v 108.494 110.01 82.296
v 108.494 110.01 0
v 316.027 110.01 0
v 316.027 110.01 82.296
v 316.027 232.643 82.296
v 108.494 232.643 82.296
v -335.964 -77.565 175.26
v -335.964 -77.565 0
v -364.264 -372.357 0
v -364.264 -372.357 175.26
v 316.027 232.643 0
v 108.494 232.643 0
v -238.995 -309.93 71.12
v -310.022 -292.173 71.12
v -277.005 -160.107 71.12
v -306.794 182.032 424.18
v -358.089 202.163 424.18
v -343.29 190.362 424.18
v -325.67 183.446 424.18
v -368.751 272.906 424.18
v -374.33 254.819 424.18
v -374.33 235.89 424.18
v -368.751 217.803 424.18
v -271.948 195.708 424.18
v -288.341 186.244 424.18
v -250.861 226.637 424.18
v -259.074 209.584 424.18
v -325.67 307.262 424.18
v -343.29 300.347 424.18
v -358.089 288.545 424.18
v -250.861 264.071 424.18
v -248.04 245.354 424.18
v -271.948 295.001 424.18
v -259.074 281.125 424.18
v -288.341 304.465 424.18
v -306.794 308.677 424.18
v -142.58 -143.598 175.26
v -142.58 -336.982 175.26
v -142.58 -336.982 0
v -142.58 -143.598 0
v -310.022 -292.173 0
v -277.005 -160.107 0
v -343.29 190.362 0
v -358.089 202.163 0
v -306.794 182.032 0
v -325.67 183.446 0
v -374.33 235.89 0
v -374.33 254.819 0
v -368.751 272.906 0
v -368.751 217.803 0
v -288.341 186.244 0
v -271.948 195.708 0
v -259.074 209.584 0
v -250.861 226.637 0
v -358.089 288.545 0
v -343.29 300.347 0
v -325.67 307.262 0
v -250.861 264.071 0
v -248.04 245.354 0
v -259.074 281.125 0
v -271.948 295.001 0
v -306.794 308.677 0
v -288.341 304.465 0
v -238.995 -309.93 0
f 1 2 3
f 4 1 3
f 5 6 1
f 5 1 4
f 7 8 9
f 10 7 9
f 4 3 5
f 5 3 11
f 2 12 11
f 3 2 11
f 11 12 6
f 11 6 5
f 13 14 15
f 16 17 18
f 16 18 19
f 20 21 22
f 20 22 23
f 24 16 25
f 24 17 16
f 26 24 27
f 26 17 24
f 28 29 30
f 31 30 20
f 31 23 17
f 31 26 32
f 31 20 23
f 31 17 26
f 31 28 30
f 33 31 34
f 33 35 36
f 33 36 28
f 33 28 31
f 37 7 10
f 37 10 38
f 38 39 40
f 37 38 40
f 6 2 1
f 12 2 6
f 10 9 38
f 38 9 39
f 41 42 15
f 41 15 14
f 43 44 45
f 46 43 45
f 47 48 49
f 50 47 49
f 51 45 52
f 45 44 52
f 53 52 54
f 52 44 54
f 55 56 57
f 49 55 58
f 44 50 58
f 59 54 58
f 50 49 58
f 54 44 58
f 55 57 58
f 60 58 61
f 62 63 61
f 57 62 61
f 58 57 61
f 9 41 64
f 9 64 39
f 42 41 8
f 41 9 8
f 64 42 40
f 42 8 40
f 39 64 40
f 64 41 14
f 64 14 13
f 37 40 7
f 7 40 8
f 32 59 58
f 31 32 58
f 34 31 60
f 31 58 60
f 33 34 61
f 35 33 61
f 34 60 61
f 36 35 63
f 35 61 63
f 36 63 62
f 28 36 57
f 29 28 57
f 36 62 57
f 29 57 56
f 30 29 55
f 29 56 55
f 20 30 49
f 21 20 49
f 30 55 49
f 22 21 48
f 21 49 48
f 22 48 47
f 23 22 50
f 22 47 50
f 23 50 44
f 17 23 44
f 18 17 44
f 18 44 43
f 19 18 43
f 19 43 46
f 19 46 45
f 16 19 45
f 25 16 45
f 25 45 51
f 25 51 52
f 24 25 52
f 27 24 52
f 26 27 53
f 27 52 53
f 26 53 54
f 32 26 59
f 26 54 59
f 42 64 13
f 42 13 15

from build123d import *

# Parameters (mm, degrees)
F0_W     = 207.5331061672
F0_H     = 122.6332091976
F1_DEPTH = 82.296
F2_DEPTH = 175.26
F0_R     = 63.5
F3_DEPTH = 424.18
F4_DEPTH = 71.12


with BuildPart() as f1:
    # F0 (on Top) → F1 (new body)
    with BuildSketch(Plane.XY):
        with Locations((212.2609269613, 171.3262020208)):
            Rectangle(F0_W, F0_H)
    extrude(amount=F1_DEPTH)


with BuildPart() as f2:
    # F0 (on Top) → F2 (new body)
    with BuildSketch(Plane.XY):
        Polygon((-142.5804198811, -143.5984707565), (-335.9635537997, -77.565192872), (-364.2635406156, -372.3565564559), (-142.5804198811, -336.9815940954), align=None)
        Polygon((-310.0219274309, -292.1732745837), (-277.0052831988, -160.1067611335), (-238.994547933, -309.9301279931), align=None, mode=Mode.SUBTRACT)
        Polygon((-238.994547933, -309.9301279931), (-277.0052831988, -160.1067611335), (-310.0219274309, -292.1732745837), align=None)
    extrude(amount=F2_DEPTH)

    # F0 (on Top) → F4 (cut)
    with BuildSketch(Plane.XY):
        Polygon((-238.994547933, -309.9301279931), (-277.0052831988, -160.1067611335), (-310.0219274309, -292.1732745837), align=None)
    extrude(amount=F4_DEPTH, mode=Mode.SUBTRACT)


with BuildPart() as f3:
    # F0 (on Top) → F3 (new body)
    with BuildSketch(Plane.XY):
        with Locations((-311.5397393703, 245.354399085)):
            Circle(F0_R)
    extrude(amount=F3_DEPTH)


solid = Compound([f1.part, f2.part, f3.part])
